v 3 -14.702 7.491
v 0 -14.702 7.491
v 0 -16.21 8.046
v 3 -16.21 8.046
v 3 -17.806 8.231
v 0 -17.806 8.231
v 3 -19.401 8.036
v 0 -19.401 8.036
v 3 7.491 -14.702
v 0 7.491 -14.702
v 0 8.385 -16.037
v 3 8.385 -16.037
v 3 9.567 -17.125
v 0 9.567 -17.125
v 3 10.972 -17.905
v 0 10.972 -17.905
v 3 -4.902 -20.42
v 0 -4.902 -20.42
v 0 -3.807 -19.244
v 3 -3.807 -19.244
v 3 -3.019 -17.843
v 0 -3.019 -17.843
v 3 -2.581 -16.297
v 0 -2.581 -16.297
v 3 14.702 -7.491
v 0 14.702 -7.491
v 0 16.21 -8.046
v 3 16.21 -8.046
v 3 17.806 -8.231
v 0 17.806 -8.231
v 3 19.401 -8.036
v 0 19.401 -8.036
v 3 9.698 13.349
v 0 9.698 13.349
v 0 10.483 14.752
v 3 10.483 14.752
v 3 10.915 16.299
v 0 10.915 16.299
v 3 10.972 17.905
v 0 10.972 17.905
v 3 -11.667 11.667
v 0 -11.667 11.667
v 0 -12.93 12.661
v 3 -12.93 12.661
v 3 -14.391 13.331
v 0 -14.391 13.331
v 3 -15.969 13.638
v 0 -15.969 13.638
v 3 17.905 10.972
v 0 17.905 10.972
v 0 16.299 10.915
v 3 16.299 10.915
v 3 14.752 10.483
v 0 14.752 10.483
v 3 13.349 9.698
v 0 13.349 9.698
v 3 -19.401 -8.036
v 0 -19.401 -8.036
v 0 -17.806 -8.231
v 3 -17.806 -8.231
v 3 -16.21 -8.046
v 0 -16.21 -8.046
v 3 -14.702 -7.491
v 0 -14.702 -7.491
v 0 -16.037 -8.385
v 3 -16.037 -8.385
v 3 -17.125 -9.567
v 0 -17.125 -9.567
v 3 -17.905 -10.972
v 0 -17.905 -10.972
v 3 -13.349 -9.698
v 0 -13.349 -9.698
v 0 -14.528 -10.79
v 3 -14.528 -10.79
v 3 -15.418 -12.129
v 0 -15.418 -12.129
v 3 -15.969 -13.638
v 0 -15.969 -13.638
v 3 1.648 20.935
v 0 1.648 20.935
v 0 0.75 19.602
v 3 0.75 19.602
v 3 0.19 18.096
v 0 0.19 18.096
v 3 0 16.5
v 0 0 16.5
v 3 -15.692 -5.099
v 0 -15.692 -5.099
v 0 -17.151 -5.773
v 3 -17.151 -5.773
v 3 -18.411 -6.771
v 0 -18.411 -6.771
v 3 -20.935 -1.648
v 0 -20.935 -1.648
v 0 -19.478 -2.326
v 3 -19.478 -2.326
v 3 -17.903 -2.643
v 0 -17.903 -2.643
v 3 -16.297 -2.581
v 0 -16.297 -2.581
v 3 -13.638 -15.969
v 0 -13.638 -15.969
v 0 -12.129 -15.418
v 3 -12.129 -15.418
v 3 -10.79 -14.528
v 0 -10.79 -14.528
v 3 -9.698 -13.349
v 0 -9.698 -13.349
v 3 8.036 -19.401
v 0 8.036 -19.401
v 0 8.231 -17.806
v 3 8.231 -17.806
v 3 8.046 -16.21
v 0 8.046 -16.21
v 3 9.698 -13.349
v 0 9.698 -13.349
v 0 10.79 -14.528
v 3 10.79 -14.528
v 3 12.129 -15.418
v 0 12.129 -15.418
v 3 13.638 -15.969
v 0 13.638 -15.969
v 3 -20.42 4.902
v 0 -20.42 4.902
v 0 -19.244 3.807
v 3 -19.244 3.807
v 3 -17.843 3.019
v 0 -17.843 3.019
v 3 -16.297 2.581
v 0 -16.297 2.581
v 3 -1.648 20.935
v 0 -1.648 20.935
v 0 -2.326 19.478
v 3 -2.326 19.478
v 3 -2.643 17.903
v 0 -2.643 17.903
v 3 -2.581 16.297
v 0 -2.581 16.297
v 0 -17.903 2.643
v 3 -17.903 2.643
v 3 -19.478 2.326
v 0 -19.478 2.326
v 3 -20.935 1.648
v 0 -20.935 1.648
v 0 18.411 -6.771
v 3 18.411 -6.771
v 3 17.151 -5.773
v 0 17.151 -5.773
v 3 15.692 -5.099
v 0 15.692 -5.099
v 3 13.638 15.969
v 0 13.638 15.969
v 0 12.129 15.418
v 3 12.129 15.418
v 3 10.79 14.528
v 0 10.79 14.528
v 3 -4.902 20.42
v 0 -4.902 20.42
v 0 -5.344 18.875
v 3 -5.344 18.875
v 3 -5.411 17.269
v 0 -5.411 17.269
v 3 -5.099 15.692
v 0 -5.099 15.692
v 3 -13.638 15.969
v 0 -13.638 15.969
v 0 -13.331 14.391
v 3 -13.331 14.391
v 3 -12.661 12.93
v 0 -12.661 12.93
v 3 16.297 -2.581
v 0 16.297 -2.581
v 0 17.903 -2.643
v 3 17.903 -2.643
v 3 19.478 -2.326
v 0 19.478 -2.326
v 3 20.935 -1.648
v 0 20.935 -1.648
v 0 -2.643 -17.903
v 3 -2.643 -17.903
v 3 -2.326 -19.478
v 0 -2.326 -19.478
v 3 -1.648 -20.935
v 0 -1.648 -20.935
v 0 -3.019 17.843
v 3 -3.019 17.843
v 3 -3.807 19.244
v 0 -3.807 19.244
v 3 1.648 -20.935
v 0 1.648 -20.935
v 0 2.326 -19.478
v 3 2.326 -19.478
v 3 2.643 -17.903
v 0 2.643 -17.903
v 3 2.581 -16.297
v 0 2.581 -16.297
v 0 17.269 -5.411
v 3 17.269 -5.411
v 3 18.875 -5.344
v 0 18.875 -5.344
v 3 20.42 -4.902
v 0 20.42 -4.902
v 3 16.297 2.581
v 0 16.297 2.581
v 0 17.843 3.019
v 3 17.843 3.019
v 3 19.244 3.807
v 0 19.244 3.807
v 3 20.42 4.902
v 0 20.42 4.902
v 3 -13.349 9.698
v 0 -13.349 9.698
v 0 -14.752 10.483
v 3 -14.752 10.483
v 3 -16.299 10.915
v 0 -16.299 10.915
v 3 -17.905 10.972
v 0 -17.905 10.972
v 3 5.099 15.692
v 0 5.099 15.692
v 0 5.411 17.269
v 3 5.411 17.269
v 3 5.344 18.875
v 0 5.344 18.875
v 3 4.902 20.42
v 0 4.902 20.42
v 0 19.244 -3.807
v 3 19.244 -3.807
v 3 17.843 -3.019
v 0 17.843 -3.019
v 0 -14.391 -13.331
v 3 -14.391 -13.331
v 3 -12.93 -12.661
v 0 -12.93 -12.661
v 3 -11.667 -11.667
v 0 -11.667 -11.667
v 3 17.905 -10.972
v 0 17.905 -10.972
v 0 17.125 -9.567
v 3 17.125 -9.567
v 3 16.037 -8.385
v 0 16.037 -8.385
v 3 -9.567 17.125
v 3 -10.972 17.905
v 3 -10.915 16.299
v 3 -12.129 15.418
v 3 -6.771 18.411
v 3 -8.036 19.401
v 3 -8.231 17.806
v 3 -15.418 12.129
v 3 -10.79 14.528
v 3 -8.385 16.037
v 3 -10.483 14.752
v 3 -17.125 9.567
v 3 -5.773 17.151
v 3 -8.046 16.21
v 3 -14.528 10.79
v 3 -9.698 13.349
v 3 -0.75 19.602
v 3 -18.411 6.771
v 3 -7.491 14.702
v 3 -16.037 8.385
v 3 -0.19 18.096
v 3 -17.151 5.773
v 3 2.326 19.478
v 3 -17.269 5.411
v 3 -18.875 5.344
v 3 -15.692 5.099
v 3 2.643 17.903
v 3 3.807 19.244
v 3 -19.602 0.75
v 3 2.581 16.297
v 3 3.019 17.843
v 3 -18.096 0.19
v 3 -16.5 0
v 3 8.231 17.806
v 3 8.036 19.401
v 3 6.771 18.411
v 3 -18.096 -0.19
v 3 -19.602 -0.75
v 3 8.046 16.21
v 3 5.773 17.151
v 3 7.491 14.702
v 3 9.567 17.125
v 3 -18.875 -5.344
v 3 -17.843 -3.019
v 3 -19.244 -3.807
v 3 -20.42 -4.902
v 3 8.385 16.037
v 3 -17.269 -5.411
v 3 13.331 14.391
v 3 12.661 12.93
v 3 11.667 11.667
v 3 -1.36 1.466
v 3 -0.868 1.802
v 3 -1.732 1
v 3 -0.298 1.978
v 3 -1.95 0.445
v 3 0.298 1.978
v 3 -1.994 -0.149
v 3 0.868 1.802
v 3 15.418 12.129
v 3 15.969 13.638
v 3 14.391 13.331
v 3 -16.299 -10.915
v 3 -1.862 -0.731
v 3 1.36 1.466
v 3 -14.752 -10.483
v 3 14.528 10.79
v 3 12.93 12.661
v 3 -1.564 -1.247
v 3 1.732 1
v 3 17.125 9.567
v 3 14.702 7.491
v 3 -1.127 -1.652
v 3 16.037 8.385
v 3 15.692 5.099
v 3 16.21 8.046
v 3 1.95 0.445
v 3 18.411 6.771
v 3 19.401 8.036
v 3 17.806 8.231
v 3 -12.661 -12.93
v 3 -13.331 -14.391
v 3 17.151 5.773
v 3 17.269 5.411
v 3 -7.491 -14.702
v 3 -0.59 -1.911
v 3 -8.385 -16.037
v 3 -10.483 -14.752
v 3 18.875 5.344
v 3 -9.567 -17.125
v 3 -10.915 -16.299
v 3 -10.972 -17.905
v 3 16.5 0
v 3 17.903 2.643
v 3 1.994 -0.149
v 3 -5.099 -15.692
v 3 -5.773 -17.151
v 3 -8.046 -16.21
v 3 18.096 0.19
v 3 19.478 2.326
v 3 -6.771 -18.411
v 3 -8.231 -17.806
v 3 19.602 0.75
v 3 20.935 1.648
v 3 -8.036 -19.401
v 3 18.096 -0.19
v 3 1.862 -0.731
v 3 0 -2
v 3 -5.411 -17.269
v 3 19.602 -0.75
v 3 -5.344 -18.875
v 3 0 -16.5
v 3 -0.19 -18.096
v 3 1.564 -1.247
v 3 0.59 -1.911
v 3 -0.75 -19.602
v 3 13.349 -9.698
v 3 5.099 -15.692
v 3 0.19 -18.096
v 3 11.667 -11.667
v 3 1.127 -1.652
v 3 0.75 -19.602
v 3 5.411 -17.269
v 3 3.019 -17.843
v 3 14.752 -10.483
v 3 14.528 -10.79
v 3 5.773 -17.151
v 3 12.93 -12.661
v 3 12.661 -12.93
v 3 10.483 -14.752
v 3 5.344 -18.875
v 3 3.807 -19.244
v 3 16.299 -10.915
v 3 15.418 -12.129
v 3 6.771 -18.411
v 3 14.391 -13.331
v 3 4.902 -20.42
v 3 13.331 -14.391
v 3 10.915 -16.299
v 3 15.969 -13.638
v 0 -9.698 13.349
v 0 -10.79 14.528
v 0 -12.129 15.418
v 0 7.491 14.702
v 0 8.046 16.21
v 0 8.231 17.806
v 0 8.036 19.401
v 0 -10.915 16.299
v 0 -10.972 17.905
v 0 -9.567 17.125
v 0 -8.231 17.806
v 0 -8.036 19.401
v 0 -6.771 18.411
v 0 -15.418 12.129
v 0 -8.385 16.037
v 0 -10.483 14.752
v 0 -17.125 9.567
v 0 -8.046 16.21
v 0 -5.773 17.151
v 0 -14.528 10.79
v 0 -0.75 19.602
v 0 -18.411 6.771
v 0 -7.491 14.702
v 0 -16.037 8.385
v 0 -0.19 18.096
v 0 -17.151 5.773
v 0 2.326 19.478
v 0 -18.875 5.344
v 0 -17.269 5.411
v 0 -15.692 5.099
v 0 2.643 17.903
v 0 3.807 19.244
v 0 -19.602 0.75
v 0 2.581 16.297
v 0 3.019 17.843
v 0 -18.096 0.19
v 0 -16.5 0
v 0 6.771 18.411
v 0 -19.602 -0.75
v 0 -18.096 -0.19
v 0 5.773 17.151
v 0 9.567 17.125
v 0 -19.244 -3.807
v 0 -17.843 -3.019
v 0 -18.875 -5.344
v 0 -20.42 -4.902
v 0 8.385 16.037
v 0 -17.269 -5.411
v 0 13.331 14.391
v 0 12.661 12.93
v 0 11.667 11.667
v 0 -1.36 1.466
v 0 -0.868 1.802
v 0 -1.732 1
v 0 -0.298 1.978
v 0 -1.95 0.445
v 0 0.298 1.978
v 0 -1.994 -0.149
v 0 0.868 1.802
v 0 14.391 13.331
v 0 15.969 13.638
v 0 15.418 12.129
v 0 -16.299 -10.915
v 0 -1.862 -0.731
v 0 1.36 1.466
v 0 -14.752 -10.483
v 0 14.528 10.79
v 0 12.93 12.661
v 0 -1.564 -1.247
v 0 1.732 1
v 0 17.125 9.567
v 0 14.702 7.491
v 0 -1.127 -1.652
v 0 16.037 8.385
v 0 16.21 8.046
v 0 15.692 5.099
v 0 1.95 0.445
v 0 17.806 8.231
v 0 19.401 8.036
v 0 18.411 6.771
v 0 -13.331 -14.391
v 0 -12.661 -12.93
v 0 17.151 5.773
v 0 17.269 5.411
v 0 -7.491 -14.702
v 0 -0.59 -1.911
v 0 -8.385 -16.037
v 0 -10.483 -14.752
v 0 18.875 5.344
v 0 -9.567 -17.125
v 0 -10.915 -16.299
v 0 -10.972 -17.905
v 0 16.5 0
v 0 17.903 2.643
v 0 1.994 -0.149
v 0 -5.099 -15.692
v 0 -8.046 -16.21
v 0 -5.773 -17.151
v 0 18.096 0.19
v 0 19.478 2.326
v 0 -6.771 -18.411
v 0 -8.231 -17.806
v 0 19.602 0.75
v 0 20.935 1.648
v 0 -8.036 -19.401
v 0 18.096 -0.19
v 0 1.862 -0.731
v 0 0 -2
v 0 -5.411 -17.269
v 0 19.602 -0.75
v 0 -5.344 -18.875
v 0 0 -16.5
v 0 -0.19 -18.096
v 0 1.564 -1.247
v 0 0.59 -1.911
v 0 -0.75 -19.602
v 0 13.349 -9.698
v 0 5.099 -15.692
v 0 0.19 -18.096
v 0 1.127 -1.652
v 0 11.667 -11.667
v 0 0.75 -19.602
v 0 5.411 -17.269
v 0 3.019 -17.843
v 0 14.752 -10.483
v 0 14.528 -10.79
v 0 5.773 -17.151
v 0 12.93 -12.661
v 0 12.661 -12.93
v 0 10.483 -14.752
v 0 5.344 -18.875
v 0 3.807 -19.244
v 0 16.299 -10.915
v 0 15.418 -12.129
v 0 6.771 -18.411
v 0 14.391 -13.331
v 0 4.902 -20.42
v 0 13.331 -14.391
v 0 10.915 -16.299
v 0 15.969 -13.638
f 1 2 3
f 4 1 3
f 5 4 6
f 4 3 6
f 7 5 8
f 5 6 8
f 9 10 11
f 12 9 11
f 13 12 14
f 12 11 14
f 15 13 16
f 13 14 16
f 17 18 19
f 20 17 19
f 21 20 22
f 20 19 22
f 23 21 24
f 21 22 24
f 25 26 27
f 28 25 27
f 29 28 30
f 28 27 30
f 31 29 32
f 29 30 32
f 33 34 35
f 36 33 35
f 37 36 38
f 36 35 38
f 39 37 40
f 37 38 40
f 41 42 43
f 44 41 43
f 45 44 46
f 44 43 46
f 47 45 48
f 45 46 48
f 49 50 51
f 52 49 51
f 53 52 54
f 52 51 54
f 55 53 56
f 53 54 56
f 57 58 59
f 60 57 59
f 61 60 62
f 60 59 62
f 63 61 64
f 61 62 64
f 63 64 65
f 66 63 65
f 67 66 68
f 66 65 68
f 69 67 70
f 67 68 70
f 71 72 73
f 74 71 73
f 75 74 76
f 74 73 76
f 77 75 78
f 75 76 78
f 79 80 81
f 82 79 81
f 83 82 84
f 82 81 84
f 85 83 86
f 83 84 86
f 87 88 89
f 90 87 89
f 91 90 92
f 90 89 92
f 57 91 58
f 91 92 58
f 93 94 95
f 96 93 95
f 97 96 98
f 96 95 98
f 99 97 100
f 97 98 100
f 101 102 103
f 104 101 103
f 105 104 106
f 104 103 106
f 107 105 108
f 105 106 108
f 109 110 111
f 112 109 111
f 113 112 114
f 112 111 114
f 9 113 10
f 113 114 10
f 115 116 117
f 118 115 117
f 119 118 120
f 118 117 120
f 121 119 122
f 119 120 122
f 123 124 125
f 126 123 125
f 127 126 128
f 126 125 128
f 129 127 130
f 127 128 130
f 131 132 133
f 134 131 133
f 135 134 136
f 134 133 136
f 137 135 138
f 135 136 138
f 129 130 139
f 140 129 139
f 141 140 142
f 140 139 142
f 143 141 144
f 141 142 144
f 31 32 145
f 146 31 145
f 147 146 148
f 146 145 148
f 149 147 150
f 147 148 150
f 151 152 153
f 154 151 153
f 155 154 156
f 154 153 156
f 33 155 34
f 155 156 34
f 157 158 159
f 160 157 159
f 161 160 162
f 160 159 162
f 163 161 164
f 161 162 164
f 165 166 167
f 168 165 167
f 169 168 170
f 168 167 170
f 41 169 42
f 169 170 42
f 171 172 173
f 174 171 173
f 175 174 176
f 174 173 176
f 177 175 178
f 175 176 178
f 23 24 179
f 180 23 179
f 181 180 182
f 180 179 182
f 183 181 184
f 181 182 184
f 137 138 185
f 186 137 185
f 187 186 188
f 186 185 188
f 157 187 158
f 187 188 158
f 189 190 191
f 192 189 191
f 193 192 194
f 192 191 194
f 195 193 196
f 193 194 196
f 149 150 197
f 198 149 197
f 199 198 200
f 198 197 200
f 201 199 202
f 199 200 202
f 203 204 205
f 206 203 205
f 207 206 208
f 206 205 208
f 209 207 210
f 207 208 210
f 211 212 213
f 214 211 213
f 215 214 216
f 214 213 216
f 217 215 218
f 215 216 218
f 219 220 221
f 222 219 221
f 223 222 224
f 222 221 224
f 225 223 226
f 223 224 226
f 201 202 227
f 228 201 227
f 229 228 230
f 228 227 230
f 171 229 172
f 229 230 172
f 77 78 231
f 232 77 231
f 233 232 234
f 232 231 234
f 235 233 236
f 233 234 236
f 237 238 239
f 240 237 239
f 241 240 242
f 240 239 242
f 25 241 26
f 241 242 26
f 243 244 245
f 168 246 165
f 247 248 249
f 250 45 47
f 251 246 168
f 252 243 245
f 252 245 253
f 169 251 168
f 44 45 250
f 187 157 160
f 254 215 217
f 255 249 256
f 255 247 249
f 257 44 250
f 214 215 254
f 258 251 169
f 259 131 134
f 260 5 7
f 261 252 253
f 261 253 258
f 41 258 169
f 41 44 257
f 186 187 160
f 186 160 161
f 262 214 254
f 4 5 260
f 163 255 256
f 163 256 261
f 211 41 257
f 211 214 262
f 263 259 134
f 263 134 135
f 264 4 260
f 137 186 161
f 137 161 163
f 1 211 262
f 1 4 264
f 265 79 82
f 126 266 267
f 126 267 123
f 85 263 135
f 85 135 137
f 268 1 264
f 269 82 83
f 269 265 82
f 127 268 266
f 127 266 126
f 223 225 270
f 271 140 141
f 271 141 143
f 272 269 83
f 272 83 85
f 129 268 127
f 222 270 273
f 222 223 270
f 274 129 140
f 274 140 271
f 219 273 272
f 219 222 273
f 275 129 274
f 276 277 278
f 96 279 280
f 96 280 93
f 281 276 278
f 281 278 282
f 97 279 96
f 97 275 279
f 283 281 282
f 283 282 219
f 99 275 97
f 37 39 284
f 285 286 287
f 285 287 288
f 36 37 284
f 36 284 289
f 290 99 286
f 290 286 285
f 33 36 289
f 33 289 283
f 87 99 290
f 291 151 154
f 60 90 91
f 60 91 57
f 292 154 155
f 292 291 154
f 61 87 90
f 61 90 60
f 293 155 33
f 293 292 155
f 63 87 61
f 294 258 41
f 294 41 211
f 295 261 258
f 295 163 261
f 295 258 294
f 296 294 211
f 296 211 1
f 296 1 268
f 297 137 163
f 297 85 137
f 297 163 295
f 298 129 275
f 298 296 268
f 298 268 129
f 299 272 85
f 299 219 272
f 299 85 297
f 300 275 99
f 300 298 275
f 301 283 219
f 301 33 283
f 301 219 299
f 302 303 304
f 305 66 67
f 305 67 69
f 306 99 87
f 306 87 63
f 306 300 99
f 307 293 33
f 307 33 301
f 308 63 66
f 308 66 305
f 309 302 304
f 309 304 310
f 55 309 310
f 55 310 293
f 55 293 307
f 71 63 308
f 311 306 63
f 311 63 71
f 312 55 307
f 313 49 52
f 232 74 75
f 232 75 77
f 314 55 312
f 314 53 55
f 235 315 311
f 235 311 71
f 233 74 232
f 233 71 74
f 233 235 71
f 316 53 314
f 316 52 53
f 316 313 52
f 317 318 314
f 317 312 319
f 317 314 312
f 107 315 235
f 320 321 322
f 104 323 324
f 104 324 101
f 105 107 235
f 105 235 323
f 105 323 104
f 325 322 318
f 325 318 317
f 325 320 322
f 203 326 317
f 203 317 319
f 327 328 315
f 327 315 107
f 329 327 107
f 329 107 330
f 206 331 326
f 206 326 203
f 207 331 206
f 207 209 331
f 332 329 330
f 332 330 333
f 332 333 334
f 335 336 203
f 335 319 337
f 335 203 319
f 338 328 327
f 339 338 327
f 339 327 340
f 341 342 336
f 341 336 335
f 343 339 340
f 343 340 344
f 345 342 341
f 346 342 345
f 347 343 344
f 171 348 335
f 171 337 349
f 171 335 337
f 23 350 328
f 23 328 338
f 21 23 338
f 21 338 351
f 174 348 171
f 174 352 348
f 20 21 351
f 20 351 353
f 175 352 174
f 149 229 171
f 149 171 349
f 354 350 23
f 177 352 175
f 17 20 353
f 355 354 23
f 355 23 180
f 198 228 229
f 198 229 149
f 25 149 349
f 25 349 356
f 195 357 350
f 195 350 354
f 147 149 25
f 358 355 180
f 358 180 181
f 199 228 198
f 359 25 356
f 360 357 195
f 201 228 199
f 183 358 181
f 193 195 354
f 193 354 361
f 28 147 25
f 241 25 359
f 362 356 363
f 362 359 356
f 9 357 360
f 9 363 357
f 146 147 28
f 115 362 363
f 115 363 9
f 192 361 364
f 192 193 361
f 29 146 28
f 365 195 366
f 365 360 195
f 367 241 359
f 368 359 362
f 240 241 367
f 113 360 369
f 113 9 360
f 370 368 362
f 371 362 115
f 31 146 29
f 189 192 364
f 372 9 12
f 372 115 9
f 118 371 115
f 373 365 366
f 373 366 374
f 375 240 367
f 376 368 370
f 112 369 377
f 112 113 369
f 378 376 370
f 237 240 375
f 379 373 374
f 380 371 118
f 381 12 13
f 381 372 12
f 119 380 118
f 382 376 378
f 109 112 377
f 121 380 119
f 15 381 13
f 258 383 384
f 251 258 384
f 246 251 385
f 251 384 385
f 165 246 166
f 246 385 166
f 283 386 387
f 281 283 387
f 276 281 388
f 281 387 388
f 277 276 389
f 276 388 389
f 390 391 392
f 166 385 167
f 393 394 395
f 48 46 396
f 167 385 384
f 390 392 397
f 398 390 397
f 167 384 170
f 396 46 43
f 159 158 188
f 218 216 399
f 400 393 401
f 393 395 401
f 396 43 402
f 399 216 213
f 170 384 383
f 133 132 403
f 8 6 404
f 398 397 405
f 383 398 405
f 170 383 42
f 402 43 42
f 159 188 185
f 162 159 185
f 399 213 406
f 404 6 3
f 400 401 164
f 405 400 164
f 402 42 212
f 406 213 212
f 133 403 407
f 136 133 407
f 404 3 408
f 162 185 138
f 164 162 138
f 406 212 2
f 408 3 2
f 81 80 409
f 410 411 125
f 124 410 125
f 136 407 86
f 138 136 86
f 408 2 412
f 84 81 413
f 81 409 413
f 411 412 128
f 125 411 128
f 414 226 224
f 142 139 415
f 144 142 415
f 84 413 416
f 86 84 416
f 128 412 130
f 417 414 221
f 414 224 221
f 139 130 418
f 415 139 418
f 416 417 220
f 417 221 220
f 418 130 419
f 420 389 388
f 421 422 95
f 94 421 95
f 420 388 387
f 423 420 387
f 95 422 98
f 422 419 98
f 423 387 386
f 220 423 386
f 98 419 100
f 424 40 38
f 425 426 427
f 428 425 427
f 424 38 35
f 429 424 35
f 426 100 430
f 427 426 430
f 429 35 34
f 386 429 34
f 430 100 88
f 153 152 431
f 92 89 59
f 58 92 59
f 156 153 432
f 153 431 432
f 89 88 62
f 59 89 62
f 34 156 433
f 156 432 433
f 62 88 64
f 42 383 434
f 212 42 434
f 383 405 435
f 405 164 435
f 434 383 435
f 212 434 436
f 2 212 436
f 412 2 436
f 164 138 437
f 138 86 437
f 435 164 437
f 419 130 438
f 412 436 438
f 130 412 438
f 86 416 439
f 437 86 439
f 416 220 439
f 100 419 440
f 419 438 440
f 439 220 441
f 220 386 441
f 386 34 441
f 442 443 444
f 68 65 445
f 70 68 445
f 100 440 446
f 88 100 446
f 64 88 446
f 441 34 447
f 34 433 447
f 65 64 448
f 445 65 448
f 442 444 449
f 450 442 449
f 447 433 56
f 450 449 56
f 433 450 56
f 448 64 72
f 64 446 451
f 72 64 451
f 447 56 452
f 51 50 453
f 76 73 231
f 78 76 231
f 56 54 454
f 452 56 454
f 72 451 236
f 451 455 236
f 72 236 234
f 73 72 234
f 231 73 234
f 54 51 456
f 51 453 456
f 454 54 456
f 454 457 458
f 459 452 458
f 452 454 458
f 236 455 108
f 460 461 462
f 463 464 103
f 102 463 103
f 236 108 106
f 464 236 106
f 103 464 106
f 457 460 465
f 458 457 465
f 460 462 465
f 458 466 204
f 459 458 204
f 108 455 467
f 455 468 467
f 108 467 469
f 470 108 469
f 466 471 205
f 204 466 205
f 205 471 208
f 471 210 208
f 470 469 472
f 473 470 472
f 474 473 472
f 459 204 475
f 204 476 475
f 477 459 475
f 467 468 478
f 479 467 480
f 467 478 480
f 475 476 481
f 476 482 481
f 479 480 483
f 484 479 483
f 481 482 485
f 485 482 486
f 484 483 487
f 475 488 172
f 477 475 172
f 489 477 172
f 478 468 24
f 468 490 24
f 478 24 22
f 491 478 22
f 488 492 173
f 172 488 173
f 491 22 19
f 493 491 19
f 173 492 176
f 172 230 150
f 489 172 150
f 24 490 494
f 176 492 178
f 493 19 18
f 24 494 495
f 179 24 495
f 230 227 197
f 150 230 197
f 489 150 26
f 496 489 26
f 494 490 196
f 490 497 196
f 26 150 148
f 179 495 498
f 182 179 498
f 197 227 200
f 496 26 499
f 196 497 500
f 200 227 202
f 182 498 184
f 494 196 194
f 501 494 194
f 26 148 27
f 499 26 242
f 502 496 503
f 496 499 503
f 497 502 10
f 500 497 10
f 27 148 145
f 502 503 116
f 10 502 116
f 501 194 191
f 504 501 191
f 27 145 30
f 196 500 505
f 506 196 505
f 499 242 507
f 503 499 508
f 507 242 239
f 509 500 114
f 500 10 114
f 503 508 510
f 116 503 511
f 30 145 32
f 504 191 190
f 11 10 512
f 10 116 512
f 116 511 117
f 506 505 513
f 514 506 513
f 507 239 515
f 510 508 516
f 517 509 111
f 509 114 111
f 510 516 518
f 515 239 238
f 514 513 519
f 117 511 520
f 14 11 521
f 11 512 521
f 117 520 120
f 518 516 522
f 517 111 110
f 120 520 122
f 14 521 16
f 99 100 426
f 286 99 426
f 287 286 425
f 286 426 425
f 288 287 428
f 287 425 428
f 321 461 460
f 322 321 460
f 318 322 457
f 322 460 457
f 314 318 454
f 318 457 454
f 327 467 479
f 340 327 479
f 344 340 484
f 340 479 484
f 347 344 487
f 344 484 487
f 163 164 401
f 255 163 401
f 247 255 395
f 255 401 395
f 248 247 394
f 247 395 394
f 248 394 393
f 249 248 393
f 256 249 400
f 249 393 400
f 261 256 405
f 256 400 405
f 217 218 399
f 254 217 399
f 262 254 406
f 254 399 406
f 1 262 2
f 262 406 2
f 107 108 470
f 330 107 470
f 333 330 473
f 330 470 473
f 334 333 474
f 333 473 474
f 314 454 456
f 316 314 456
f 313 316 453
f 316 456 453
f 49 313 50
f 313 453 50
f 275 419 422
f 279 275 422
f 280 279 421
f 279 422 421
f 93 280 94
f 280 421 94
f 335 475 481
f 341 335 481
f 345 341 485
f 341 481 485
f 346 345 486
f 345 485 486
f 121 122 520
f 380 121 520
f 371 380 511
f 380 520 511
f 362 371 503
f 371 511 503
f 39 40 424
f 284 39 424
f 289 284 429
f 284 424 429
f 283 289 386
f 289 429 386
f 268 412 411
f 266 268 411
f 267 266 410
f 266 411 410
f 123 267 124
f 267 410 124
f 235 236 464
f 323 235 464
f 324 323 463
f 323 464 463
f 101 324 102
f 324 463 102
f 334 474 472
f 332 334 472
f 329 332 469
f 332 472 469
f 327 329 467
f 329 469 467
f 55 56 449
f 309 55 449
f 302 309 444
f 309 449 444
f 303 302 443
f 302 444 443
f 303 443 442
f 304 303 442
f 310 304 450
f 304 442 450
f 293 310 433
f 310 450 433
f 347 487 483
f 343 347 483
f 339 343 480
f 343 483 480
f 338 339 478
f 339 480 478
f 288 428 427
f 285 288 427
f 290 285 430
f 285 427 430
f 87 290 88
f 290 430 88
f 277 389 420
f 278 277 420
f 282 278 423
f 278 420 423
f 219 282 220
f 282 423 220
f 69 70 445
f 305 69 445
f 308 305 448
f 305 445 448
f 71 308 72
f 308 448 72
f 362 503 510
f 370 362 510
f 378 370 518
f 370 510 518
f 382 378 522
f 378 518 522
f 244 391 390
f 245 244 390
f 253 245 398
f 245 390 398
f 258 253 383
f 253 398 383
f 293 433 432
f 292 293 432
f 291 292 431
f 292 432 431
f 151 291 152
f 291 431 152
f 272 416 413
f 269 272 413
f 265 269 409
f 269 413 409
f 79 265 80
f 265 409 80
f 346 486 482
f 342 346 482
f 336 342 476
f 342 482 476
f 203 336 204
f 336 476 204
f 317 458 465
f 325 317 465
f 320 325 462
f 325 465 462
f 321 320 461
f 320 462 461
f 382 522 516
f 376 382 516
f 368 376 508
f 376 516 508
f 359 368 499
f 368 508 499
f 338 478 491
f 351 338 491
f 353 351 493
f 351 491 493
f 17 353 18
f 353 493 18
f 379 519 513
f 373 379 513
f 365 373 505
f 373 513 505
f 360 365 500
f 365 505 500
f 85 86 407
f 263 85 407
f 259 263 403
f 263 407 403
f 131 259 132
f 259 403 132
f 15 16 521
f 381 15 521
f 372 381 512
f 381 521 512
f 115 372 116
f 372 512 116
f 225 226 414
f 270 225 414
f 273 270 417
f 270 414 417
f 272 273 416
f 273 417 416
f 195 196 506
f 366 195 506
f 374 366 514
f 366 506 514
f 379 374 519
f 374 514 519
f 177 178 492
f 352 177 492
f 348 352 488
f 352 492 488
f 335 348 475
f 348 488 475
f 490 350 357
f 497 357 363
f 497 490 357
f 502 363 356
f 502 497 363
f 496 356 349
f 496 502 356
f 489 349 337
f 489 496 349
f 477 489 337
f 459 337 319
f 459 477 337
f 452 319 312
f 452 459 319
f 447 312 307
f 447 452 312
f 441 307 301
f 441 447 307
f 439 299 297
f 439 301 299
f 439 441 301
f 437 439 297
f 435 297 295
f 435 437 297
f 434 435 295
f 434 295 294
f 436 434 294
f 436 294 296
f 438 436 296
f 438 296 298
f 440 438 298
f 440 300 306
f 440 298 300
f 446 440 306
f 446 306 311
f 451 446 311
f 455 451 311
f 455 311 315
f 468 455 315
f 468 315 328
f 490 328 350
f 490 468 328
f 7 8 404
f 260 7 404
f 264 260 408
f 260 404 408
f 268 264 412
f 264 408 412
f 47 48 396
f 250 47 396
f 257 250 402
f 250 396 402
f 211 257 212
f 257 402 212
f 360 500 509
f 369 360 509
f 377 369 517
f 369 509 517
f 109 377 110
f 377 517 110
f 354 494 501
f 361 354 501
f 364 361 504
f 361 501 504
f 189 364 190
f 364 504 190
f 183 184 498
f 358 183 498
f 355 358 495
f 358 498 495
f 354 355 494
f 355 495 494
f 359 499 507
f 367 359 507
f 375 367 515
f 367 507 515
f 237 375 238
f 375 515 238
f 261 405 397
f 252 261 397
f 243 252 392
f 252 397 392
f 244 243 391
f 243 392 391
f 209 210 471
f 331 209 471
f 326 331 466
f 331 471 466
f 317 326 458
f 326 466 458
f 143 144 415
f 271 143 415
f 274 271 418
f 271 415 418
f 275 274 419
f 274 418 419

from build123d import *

# Parameters (mm, degrees)
BOSS_EXTRUDE1_DEPTH = 3
CIRPATTERN1_COUNT   = 40
SKETCH2_R           = 2
CUT_EXTRUDE2_DEPTH  = 4


with BuildPart() as part:
    # Sketch1 → Boss-Extrude1 (new body)
    with BuildSketch(Plane(origin=(0, 0, 0), x_dir=(0, 0, -1), z_dir=(1, 0, 0))):
        with BuildLine():
            Line((0, 16.5), (0, 0))
            Line((0, 0), (2.581168673, 16.29685762))
            ThreePointArc((2.581168673, 16.29685762), (2.531264023, 18.699958072), (1.64764101, 20.935264008))
            ThreePointArc((1.64764101, 20.935264008), (0.425217975, 18.865707491), (0, 16.5))
        make_face()
    boss_extrude1 = extrude(amount=BOSS_EXTRUDE1_DEPTH)

    # CirPattern1: Boss-Extrude1 ×40 about axis
    cirpattern1_axis = Axis((0, 0, 0), (1, 0, 0))
    for i in range(1, CIRPATTERN1_COUNT):
        add(boss_extrude1.rotate(cirpattern1_axis, i * 360 / CIRPATTERN1_COUNT))

    # Sketch2 → Cut-Extrude2 (cut, through all)
    with BuildSketch(Plane(origin=(0, 0, 0), x_dir=(0, 0, -1), z_dir=(1, 0, 0))):
        Circle(SKETCH2_R)
    extrude(amount=CUT_EXTRUDE2_DEPTH, mode=Mode.SUBTRACT)


solid = part.part
